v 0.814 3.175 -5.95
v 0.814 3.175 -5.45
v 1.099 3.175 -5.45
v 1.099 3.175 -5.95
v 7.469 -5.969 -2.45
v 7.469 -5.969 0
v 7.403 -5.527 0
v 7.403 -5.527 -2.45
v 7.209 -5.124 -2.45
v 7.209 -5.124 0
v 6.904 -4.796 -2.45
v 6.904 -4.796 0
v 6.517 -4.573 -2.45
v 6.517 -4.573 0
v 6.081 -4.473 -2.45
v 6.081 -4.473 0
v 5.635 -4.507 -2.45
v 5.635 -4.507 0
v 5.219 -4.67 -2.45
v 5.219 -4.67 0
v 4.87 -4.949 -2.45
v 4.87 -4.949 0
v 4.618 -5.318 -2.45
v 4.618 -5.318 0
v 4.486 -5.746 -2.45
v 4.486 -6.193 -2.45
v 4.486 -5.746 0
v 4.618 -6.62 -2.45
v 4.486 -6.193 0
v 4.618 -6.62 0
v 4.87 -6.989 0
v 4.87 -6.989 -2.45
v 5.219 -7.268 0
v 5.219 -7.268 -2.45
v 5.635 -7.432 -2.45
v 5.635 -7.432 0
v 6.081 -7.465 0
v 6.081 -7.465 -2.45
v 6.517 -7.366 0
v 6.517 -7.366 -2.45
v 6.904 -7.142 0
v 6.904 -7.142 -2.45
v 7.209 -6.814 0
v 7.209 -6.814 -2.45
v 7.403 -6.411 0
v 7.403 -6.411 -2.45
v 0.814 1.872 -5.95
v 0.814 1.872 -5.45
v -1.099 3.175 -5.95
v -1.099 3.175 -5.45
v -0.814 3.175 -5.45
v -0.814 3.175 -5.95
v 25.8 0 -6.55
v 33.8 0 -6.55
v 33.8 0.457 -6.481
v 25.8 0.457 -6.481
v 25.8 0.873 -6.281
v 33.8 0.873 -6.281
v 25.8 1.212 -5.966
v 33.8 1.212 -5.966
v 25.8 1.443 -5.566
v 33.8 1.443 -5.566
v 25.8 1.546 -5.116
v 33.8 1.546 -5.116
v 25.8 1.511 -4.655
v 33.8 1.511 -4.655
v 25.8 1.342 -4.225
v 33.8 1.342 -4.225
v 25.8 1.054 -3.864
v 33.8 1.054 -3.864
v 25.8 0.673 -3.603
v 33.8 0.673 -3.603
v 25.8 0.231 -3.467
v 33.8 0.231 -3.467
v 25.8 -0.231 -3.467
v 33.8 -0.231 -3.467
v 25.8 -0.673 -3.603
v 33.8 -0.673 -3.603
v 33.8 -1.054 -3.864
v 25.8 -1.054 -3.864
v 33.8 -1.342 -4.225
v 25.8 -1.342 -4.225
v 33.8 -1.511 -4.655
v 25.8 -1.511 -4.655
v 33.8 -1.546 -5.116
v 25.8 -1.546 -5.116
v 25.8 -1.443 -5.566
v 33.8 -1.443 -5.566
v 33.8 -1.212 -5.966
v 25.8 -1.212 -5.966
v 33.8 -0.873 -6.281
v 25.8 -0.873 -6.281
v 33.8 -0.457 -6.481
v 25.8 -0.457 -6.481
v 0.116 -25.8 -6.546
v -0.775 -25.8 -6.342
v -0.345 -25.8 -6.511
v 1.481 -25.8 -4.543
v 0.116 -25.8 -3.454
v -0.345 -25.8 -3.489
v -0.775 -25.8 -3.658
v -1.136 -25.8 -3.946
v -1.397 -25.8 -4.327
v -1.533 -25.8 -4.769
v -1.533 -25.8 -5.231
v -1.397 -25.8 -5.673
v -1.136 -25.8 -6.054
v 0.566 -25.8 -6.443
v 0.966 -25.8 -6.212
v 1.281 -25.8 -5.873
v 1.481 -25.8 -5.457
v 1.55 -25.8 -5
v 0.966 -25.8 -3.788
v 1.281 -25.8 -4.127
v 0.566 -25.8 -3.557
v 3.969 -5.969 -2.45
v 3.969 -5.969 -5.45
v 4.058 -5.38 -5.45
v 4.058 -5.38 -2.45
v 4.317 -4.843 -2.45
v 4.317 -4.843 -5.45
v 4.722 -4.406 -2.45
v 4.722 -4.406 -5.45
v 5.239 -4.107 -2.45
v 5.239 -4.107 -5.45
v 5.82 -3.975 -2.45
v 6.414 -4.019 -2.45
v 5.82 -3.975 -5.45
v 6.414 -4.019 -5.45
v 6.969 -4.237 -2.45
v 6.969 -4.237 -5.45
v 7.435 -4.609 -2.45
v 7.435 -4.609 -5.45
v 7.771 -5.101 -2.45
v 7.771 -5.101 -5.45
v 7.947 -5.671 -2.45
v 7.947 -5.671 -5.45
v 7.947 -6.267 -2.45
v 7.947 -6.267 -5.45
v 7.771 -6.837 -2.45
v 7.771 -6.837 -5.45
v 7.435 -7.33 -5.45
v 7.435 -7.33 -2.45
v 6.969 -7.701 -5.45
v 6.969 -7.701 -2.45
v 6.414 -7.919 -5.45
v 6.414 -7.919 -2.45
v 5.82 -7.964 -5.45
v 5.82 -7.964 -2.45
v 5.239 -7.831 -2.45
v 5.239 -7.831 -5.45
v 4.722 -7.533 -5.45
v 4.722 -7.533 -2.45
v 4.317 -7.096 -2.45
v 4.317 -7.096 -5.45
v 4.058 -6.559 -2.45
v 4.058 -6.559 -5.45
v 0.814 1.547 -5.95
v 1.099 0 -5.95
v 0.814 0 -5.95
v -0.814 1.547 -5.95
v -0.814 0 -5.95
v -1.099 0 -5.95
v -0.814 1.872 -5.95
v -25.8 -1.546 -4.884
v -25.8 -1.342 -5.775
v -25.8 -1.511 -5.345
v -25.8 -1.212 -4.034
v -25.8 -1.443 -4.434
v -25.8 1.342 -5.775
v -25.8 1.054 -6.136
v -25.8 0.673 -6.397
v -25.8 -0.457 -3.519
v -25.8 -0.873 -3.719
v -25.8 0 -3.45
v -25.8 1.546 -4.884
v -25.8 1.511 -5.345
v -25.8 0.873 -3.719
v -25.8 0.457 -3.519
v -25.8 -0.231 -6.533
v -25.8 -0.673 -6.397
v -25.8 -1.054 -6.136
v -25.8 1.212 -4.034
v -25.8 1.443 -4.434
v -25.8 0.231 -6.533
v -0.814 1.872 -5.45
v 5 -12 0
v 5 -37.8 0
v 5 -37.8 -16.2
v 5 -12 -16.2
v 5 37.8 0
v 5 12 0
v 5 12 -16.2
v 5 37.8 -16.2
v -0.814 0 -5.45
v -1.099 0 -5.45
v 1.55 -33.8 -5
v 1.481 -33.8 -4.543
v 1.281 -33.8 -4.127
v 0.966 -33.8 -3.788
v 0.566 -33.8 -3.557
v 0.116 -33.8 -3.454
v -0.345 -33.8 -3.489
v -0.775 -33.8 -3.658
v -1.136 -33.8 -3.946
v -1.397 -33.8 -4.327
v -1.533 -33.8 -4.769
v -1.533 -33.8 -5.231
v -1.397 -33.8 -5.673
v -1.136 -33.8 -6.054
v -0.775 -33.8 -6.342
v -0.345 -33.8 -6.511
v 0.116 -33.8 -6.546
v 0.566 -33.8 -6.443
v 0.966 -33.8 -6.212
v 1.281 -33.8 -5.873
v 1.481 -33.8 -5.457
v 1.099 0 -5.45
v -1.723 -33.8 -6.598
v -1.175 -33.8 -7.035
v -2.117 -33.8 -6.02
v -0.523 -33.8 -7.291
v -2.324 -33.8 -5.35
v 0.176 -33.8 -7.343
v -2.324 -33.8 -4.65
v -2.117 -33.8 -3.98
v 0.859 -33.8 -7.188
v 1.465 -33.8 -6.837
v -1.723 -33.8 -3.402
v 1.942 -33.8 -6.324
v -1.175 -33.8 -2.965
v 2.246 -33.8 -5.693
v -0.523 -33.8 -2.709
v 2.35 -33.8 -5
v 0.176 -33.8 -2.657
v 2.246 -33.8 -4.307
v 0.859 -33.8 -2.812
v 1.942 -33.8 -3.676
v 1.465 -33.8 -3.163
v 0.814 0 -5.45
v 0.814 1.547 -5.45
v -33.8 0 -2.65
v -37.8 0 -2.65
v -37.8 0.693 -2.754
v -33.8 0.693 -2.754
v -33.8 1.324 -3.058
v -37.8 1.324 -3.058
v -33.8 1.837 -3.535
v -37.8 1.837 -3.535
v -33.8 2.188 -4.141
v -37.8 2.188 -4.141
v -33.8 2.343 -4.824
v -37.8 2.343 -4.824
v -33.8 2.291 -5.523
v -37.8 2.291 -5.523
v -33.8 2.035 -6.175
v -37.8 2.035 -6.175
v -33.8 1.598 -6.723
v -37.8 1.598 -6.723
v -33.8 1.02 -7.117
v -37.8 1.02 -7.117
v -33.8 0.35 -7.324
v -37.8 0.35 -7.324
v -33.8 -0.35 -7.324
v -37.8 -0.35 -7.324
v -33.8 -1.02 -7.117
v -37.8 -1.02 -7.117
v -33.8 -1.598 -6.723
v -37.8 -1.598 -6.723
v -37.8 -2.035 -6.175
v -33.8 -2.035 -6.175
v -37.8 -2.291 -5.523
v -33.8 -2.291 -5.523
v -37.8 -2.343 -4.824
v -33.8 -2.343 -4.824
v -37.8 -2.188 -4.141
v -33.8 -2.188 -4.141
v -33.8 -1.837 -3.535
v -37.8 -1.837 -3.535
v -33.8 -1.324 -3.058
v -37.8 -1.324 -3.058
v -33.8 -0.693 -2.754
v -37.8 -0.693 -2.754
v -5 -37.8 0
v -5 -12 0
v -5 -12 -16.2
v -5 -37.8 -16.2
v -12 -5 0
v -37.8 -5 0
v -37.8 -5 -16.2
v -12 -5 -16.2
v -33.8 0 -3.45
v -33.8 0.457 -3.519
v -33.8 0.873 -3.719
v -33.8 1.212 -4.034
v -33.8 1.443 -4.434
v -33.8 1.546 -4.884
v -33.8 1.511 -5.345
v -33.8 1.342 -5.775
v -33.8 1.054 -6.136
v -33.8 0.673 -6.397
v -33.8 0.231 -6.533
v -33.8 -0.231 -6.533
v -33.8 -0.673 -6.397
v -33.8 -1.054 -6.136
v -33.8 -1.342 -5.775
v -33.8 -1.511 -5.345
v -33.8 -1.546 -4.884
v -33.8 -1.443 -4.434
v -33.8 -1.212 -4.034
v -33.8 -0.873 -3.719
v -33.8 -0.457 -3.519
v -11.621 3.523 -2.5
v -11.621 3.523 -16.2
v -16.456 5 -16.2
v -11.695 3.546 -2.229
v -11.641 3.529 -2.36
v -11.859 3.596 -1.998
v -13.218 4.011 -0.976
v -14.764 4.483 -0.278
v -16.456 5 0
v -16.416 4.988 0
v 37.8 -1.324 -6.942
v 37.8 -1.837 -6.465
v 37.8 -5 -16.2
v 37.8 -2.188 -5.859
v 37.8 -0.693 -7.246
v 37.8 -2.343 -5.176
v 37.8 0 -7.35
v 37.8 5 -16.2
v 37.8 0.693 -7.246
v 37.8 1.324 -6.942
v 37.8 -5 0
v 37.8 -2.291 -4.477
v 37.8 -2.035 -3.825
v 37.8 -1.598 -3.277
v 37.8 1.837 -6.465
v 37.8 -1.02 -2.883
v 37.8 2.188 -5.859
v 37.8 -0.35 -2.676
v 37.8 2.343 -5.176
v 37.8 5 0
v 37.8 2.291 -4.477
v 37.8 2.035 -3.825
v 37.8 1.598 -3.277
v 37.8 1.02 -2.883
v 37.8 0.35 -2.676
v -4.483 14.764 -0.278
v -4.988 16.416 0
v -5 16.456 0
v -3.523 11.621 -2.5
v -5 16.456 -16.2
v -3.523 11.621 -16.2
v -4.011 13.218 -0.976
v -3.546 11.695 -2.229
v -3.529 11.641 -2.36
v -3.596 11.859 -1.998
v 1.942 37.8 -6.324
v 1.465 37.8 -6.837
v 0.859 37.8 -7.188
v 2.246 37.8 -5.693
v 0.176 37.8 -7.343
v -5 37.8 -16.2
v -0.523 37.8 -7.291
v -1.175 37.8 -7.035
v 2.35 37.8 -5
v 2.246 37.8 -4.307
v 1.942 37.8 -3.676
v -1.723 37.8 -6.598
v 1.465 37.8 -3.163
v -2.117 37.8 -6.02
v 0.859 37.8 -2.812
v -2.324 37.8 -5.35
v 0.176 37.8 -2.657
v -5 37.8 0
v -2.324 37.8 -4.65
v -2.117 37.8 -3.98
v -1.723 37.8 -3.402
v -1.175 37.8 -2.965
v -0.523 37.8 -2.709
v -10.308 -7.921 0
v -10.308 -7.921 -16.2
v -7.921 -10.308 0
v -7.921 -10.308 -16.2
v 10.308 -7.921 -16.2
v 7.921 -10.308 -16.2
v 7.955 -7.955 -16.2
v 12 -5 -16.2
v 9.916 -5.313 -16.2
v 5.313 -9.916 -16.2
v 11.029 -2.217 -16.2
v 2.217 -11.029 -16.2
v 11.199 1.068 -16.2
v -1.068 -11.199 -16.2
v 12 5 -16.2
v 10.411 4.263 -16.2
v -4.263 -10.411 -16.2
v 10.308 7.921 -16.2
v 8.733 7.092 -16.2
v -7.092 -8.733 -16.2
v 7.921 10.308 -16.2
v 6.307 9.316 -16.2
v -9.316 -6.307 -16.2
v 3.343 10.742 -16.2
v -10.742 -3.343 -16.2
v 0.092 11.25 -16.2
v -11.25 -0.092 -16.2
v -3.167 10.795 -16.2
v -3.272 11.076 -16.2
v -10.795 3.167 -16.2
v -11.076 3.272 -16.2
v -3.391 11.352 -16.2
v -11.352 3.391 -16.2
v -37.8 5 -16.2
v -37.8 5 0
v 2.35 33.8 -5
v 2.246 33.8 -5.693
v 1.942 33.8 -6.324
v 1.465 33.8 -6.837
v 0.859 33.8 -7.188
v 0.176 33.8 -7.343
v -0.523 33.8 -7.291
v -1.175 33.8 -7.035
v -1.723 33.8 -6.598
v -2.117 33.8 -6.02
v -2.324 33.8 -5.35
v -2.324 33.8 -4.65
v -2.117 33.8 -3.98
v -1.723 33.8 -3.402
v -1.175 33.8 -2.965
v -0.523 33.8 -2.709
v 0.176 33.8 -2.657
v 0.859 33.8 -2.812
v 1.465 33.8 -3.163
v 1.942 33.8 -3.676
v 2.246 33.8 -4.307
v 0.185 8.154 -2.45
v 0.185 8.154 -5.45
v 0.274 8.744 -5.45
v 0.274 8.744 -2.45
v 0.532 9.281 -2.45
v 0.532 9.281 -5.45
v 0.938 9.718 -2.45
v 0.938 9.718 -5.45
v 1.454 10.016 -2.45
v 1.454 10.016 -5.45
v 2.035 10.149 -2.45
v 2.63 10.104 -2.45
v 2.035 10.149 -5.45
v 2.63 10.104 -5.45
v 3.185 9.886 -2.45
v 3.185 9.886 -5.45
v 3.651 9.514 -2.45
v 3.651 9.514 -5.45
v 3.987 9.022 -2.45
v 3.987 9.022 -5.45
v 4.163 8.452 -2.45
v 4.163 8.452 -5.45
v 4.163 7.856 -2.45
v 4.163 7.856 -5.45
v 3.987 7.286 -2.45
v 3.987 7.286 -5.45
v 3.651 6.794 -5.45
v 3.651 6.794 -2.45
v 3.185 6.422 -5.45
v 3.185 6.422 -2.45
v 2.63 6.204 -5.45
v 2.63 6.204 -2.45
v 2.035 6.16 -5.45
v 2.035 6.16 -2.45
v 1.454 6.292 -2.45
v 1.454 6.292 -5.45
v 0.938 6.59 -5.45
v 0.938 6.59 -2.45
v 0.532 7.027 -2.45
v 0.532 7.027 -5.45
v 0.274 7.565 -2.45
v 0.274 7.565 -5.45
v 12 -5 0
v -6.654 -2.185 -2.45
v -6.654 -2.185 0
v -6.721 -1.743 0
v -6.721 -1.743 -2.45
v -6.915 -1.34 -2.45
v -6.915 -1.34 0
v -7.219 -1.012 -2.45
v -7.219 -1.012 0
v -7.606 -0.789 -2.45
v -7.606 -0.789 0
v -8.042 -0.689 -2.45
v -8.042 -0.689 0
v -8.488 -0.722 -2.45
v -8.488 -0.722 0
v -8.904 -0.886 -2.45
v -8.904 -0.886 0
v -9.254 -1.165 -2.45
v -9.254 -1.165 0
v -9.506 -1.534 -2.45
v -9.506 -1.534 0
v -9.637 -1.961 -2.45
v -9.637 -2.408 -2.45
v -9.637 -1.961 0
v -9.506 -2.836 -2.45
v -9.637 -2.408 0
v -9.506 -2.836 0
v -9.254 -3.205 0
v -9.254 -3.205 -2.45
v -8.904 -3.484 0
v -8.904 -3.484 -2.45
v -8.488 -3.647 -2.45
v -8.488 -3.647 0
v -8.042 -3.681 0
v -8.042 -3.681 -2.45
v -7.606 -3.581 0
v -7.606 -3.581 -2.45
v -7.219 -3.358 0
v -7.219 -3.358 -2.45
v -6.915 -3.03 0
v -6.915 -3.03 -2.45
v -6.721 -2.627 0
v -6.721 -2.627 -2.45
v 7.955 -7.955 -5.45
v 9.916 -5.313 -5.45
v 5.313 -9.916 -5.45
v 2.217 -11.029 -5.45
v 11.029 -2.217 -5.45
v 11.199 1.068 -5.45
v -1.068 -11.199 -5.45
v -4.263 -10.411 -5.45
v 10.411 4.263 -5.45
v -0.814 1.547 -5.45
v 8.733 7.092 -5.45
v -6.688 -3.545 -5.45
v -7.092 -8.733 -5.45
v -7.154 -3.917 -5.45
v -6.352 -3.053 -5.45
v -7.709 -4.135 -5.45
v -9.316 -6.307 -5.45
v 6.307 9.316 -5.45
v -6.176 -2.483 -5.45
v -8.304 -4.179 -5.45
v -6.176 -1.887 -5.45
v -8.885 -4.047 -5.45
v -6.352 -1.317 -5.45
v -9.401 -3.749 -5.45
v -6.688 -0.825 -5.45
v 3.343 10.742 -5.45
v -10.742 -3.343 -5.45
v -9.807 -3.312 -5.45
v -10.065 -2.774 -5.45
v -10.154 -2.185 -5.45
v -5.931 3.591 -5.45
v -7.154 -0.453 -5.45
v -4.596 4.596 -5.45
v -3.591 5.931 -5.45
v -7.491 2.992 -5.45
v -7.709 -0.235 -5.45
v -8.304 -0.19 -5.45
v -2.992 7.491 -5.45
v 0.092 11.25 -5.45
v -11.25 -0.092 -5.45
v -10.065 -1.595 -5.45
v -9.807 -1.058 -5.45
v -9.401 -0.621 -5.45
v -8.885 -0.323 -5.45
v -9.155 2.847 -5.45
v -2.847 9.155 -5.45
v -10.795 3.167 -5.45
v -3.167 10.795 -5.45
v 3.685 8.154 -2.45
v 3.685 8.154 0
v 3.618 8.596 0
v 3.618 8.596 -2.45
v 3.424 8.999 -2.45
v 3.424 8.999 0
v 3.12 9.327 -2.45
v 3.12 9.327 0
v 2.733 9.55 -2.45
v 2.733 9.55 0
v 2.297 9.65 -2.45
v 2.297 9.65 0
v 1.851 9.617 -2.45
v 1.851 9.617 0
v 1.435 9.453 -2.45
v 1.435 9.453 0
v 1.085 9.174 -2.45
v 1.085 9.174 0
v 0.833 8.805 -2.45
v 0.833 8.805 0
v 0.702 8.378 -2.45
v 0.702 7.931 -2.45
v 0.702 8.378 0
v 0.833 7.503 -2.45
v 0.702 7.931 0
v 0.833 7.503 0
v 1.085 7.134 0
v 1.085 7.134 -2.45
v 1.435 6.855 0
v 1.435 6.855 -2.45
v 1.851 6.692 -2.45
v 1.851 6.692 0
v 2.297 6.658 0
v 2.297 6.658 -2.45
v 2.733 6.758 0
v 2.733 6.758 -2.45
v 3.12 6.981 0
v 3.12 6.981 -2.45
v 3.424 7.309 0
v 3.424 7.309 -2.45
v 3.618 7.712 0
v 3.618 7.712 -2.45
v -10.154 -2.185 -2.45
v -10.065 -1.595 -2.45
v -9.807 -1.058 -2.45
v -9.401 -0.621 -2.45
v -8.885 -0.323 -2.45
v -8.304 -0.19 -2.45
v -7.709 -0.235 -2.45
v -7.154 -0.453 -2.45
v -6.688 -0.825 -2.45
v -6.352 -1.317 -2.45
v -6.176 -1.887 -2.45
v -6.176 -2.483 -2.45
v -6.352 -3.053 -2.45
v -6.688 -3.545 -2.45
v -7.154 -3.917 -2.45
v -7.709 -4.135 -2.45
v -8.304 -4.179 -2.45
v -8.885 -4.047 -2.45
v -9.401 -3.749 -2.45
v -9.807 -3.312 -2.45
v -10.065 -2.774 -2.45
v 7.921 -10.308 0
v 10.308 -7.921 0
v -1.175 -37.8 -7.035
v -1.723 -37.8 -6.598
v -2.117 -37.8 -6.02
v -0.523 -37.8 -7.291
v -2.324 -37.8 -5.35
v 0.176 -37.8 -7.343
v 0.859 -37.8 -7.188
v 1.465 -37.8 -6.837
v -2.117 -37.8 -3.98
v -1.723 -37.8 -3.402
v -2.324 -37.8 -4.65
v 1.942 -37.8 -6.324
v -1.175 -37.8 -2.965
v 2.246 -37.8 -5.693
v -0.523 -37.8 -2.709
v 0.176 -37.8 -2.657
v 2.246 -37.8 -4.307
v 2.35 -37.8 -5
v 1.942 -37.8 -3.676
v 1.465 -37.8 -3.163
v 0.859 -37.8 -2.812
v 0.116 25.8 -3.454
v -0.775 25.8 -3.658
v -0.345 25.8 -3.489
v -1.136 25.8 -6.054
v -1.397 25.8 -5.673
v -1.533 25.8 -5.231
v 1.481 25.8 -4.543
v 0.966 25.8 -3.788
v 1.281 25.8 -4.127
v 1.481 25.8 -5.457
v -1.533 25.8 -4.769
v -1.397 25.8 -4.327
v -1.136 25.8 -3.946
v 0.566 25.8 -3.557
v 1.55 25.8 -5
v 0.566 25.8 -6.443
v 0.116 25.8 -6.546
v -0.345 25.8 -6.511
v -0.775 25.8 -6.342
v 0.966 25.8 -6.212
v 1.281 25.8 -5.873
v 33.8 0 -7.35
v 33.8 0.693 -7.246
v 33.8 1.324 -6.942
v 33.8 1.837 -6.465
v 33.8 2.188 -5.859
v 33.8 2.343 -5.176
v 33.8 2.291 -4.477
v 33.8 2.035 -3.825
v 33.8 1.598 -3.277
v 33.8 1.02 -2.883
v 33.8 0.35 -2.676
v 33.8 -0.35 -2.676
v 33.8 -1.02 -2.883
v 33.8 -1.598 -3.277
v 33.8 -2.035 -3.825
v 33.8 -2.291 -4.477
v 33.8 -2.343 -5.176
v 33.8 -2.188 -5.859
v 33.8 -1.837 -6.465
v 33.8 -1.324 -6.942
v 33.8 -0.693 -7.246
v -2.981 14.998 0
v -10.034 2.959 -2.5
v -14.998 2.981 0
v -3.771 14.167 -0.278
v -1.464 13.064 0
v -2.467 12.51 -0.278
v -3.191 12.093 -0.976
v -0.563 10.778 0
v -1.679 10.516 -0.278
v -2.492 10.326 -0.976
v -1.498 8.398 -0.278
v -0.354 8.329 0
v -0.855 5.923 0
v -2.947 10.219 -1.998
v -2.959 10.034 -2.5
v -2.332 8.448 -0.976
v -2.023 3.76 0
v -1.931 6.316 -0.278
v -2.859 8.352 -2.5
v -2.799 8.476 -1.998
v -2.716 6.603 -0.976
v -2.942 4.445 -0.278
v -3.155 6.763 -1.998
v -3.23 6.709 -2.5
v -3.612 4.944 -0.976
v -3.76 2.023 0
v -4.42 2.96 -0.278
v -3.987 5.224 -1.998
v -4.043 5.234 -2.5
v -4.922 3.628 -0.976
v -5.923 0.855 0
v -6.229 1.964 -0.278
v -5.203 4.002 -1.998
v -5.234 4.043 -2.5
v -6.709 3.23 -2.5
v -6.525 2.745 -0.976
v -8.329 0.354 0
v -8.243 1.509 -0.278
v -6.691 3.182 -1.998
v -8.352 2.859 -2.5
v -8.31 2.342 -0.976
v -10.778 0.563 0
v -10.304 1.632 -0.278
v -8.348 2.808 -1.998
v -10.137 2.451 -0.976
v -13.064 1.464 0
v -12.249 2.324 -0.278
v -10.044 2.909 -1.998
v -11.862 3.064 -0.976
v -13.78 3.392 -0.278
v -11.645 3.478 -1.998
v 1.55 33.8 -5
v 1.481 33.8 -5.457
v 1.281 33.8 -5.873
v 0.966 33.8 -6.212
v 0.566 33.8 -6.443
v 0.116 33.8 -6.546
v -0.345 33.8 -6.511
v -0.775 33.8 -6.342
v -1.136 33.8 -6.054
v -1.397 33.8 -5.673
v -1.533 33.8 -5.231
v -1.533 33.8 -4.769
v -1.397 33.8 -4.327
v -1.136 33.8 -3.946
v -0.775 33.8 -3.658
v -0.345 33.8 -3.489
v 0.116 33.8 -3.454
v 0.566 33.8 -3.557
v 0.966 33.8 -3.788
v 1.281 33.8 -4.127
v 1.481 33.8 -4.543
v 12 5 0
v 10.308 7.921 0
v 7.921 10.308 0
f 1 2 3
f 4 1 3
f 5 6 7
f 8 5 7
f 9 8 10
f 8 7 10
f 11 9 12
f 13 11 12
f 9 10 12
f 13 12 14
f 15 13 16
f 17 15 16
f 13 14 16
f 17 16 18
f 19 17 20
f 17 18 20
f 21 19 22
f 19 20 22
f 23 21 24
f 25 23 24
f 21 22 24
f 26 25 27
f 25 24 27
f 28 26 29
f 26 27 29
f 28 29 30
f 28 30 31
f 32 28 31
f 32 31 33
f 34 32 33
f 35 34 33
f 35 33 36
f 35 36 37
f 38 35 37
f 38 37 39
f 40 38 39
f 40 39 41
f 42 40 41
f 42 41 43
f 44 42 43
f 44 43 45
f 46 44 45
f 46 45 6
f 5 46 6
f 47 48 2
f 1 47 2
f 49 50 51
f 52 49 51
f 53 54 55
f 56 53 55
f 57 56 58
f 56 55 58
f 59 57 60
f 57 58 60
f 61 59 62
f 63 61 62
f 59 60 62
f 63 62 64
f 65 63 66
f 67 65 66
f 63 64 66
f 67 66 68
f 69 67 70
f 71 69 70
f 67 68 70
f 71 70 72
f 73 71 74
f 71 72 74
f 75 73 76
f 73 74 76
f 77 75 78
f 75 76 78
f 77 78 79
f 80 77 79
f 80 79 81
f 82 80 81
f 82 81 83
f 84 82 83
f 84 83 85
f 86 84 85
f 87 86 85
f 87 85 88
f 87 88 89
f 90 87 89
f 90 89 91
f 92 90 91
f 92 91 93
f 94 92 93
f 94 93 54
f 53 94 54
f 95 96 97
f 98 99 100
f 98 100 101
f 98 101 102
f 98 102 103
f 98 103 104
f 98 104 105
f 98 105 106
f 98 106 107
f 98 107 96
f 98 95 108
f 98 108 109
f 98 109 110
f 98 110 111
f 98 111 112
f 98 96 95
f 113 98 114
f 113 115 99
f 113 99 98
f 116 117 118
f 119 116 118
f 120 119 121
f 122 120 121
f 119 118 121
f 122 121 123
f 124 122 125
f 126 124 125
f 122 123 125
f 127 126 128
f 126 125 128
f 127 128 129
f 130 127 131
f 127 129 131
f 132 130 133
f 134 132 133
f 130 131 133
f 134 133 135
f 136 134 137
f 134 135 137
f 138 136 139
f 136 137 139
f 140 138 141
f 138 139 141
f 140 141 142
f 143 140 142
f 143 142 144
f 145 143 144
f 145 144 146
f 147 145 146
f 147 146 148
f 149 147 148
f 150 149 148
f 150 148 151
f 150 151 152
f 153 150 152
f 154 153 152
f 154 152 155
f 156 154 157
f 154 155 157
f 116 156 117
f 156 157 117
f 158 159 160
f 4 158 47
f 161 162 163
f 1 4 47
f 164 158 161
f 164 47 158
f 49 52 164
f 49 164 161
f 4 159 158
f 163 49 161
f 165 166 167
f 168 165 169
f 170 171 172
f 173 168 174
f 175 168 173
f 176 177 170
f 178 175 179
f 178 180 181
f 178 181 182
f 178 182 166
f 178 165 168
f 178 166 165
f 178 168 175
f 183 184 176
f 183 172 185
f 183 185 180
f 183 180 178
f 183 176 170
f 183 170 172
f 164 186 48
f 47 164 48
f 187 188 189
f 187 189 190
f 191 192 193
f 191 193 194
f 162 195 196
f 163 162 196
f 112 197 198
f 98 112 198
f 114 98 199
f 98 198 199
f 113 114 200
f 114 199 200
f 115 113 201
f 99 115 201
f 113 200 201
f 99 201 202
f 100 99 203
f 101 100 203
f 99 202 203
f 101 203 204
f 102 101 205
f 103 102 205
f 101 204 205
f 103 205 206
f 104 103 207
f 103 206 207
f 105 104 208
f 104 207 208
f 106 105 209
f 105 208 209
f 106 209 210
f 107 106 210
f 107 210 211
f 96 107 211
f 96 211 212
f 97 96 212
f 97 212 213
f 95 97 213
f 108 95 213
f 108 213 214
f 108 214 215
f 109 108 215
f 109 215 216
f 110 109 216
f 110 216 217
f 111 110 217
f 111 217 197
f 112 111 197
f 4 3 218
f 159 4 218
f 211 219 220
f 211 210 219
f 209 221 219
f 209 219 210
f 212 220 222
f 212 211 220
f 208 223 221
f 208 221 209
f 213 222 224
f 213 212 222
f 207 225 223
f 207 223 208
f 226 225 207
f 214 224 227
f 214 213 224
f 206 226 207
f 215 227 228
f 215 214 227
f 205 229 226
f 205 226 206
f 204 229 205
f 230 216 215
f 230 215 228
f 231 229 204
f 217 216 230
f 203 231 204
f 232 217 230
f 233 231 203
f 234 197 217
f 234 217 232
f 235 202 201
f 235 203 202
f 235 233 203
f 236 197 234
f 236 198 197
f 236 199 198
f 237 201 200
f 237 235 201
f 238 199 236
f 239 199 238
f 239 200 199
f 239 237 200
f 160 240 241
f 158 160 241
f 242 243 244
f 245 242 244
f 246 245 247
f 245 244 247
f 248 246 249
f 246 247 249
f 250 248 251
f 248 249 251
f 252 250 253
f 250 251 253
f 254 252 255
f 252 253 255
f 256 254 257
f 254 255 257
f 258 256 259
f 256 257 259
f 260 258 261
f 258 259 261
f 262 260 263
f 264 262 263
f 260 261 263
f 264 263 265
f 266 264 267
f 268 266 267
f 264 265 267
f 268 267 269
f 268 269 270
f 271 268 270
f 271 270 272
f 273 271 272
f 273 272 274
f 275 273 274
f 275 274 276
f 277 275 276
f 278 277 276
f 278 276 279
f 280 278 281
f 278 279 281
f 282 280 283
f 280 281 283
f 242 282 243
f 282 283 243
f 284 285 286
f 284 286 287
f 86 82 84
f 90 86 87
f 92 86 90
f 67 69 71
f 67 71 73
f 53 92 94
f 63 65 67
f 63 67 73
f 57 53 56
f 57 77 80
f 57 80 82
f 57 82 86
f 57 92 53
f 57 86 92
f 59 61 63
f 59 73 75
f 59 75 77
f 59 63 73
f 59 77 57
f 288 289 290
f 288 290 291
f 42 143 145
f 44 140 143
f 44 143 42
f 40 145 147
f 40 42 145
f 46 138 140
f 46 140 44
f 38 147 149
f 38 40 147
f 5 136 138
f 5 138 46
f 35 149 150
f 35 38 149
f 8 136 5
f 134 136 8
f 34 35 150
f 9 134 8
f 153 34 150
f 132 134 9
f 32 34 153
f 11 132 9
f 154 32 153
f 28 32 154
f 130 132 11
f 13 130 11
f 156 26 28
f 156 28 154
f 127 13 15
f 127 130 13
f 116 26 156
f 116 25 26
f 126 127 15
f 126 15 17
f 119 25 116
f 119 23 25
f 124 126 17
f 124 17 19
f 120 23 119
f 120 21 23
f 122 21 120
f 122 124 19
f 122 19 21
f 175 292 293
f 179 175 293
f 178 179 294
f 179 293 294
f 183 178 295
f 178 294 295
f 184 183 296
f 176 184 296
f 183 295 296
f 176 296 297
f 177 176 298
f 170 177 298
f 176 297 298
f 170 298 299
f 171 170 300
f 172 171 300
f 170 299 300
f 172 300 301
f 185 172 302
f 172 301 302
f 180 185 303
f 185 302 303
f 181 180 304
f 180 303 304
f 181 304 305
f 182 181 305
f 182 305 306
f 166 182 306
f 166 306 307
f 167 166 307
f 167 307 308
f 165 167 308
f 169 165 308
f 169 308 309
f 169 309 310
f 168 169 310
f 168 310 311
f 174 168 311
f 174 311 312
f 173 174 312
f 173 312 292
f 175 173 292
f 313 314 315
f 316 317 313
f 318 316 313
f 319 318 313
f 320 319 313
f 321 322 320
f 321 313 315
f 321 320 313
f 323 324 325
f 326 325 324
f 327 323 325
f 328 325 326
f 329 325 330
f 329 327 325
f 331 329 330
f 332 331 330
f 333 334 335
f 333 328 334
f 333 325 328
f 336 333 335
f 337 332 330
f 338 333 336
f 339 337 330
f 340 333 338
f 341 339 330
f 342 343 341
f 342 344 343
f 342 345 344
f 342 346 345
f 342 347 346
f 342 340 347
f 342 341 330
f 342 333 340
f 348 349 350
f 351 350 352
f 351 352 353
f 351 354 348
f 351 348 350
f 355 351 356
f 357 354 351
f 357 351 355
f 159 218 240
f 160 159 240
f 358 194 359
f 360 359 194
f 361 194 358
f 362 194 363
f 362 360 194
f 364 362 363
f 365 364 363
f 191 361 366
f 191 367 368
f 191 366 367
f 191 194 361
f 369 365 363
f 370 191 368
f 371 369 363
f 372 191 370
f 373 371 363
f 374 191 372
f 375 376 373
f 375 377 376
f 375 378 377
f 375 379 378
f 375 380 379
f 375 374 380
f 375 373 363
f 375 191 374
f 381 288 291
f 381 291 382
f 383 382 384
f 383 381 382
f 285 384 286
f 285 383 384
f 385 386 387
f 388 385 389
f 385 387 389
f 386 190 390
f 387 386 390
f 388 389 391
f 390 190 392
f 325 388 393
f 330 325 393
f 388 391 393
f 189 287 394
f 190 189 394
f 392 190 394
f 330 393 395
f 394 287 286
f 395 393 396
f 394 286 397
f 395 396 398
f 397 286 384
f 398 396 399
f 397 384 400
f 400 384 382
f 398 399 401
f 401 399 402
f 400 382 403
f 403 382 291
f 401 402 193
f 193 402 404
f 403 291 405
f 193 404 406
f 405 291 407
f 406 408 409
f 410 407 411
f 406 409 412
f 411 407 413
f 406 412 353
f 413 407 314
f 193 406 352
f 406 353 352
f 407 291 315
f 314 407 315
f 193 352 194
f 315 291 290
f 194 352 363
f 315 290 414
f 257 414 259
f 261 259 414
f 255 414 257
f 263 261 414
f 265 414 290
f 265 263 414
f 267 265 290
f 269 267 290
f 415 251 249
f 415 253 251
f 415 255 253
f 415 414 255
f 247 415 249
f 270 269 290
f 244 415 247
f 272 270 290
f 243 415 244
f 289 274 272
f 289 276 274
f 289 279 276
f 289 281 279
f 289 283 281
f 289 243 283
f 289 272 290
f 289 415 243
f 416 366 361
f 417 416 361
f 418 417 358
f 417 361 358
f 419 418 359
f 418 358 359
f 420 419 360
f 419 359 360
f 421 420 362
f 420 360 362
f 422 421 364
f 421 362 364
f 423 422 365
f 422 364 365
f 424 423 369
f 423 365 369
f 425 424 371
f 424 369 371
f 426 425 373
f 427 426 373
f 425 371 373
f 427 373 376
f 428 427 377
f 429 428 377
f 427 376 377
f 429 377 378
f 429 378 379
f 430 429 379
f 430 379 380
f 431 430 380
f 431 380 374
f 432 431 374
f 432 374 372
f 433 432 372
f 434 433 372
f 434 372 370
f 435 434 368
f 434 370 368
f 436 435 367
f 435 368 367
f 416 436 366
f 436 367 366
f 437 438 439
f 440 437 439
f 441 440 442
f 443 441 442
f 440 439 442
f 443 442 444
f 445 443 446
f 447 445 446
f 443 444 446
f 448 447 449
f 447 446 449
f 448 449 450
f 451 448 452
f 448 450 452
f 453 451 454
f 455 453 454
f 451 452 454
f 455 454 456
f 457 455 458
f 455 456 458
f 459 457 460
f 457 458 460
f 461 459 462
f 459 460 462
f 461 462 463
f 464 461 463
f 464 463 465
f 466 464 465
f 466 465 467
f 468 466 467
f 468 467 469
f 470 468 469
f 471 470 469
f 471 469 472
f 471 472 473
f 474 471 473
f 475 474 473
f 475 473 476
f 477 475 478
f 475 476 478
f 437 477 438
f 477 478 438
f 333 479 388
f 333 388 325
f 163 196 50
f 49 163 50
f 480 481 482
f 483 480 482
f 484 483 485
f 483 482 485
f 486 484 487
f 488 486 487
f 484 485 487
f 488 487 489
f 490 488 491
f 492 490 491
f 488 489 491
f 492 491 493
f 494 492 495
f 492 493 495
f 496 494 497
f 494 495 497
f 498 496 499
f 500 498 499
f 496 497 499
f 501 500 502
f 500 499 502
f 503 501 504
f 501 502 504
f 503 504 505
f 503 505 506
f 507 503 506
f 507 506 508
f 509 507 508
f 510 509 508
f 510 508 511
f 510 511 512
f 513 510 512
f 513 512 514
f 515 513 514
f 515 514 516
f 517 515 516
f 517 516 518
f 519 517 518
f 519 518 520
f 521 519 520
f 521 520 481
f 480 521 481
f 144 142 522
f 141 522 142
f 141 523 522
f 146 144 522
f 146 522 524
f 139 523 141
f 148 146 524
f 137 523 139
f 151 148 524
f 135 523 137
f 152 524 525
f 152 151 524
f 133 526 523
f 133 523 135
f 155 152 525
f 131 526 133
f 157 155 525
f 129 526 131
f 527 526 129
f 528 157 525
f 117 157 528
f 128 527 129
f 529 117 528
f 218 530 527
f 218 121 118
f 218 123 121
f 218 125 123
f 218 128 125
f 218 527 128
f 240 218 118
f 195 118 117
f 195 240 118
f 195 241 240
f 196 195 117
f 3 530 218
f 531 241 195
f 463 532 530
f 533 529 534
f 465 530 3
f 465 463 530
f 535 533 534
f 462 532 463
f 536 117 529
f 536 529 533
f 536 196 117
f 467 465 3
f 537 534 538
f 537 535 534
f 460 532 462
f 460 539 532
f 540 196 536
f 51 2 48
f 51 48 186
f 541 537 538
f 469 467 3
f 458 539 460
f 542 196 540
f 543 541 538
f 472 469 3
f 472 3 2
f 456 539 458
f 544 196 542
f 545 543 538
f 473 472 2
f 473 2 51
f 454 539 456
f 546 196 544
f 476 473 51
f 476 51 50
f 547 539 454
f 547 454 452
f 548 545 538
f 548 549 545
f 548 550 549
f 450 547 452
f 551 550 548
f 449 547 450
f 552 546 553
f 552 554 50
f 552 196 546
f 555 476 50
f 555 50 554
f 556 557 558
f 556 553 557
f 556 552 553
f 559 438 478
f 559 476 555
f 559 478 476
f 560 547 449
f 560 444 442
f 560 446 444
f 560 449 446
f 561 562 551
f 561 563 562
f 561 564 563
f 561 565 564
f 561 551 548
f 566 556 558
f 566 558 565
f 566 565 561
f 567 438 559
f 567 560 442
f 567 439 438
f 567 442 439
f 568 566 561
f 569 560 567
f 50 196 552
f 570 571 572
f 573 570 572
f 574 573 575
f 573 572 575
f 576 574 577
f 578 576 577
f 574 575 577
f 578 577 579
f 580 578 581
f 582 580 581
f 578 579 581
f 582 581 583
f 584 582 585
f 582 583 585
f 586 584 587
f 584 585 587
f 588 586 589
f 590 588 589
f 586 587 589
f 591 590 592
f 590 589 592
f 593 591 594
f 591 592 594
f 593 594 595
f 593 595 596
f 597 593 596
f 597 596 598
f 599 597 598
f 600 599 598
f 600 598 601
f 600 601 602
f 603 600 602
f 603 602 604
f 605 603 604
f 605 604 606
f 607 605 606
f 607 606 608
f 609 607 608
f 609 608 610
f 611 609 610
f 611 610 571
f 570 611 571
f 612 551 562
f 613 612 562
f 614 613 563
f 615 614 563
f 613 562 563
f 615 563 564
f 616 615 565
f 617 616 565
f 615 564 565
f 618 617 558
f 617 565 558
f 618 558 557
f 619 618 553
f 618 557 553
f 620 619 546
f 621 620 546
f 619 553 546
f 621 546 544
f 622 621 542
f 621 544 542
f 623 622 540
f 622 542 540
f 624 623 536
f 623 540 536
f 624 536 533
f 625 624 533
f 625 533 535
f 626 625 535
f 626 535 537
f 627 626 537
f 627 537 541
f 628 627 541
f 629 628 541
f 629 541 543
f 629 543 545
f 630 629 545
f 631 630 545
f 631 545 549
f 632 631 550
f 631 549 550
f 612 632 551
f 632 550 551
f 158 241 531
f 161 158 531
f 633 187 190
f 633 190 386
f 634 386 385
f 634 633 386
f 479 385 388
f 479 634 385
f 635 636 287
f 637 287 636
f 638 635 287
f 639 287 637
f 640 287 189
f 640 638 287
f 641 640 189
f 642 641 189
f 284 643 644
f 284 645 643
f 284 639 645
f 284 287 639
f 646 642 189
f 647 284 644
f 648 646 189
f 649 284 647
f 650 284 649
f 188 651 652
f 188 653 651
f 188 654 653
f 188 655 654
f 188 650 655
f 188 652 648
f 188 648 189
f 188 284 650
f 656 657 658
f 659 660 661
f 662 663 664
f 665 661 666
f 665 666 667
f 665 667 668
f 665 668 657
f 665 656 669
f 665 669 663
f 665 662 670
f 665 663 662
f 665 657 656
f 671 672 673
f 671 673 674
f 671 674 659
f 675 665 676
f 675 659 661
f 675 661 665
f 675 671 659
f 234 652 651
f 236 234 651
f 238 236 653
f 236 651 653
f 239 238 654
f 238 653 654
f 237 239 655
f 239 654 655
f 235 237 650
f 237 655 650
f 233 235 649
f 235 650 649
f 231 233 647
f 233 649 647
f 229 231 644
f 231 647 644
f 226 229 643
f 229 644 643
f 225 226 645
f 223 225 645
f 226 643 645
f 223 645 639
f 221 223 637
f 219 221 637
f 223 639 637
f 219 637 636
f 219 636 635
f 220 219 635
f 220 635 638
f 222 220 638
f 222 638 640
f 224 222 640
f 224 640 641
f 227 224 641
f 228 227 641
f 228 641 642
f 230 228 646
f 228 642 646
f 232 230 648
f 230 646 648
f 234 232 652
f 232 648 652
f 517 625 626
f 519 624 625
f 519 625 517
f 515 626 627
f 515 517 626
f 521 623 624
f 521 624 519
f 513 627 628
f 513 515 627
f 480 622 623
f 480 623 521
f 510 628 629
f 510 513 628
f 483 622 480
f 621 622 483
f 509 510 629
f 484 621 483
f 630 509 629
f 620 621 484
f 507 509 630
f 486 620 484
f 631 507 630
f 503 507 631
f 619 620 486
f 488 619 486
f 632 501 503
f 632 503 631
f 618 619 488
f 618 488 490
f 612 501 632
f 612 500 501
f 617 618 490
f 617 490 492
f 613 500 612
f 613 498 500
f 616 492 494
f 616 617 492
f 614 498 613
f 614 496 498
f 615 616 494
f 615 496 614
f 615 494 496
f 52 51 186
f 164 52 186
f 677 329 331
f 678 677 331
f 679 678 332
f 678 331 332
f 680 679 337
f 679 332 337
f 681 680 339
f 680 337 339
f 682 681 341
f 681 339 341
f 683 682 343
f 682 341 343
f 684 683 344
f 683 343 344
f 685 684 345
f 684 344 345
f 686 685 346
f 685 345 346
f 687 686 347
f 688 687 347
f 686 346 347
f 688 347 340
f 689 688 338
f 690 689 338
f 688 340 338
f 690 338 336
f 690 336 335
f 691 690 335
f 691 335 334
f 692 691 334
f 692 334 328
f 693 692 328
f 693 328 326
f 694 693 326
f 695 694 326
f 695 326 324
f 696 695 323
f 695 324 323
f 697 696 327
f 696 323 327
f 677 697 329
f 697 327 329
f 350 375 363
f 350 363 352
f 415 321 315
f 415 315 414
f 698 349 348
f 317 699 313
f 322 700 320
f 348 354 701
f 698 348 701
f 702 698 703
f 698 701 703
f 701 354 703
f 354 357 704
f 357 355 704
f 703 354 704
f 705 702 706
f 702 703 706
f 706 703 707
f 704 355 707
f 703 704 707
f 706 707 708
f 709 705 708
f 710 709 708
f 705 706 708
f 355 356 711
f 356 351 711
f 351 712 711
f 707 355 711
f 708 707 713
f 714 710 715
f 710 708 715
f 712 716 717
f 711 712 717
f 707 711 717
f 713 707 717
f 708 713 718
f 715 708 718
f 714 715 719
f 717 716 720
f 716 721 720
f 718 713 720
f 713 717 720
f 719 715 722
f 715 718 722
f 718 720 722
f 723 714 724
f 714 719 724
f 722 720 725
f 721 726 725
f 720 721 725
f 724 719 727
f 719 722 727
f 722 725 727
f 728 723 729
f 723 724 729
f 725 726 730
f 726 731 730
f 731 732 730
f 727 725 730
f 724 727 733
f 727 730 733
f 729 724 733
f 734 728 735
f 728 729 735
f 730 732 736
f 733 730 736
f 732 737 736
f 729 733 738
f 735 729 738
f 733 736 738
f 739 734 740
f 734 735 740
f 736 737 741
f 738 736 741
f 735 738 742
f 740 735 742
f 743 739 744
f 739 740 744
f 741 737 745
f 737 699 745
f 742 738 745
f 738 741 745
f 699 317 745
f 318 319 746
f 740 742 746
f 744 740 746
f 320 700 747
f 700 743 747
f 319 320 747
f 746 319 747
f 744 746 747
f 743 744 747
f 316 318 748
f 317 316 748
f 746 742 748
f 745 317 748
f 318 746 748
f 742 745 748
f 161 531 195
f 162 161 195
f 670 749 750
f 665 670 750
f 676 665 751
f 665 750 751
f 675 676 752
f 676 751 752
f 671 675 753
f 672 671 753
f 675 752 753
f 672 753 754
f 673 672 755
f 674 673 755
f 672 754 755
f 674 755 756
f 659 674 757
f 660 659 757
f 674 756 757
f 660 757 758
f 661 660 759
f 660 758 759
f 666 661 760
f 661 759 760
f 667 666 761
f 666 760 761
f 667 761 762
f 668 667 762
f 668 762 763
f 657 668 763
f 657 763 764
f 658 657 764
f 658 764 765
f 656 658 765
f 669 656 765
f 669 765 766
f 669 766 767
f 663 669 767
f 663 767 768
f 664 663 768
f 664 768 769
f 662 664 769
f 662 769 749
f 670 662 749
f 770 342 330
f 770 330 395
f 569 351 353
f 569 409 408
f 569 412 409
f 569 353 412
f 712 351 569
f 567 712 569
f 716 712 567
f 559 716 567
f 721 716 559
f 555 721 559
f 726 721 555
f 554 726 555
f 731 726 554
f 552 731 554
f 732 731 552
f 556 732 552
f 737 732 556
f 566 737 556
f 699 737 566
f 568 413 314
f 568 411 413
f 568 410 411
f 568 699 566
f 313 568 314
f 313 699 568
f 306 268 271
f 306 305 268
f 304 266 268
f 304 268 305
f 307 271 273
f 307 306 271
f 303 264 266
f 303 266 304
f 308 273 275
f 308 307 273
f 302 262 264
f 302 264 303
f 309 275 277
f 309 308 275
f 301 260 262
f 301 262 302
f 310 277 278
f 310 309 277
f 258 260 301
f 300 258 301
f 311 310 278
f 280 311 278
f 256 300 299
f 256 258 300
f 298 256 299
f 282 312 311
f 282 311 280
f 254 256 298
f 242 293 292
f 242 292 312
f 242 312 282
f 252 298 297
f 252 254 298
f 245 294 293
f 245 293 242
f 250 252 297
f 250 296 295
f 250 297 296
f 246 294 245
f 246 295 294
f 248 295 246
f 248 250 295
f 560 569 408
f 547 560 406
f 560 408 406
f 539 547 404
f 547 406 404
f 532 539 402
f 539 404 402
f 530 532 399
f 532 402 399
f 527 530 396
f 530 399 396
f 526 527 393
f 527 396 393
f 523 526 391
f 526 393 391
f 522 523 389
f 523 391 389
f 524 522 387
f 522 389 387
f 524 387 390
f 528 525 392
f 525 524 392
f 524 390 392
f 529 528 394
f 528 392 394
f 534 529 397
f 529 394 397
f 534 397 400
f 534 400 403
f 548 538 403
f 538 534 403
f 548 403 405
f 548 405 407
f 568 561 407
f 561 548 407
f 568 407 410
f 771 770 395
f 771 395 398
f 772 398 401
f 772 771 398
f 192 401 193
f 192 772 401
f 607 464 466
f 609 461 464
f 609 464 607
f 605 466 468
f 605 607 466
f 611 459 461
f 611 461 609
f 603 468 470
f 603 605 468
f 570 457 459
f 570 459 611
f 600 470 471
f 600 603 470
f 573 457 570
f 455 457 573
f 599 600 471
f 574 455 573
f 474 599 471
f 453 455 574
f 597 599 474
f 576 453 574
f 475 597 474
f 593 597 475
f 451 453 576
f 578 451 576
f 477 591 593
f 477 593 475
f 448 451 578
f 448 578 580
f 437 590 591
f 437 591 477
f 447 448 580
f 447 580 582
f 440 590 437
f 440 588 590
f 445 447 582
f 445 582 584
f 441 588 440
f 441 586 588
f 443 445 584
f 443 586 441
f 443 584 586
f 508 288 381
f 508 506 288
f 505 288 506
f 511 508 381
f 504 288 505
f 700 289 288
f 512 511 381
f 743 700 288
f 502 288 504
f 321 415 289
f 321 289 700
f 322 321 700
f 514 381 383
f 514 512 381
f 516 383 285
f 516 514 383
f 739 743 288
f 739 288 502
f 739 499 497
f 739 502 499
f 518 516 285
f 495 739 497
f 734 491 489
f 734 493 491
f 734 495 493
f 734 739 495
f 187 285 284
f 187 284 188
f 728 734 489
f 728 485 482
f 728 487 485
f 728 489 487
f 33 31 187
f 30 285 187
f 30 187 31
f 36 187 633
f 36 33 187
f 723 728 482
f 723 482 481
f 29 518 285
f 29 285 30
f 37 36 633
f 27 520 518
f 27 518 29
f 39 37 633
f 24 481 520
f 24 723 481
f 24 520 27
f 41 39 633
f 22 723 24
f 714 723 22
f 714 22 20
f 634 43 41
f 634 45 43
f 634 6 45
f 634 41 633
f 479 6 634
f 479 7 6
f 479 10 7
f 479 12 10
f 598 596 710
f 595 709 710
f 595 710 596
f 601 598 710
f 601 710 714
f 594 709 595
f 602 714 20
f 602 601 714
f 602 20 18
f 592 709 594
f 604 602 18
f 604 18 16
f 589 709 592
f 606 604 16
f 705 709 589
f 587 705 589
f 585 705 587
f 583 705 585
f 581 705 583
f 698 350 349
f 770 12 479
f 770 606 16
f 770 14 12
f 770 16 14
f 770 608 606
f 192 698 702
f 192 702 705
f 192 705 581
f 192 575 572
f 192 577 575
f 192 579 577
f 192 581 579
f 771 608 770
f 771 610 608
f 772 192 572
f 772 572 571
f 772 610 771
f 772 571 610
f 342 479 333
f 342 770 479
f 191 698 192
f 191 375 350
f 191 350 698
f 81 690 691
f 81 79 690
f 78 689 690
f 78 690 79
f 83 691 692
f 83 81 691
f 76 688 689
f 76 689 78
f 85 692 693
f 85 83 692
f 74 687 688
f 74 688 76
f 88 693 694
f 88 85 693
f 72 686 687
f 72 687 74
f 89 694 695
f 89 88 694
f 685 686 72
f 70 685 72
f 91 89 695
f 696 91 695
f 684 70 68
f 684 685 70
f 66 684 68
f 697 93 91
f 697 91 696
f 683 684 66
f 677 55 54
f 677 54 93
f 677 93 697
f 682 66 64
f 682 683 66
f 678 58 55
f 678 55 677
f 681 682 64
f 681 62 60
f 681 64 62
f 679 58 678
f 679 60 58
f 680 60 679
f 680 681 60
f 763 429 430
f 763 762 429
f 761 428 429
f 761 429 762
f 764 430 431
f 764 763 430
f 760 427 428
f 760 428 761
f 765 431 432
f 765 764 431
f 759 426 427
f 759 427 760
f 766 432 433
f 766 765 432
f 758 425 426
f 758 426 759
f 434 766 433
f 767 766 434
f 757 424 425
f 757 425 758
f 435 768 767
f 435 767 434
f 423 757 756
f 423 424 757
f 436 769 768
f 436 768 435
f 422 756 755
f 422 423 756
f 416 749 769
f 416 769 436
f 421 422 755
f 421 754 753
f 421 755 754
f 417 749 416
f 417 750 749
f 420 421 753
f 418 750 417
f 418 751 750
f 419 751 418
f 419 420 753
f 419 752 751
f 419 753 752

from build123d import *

# Parameters (mm, degrees)
BOSS_EXTRUDE1_DEPTH     = 22.7
SKETCH5_R               = 1.5
CUT_EXTRUDE1_DEPTH      = 70
CUT_EXTRUDE3_DEPTH      = 17.25
CUT_EXTRUDE3_DEPTH_BACK = 17.25
SKETCH6_R               = 11.25
SKETCH7_R               = 2
CUT_EXTRUDE4_DEPTH      = 3
CUT_EXTRUDE5_DEPTH      = 58
CUT_EXTRUDE5_DEPTH_BACK = 66
SKETCH8_W               = 6.5
SKETCH8_H               = 75.6
SKETCH9_R               = 2.35
SKETCH9_R_2             = 1.55
CUT_EXTRUDE7_DEPTH      = 4
SKETCH9_3_R             = 1.55
CUT_EXTRUDE20_DEPTH     = 12
SKETCH21_R              = 2.35
SKETCH21_R_2            = 1.55
CUT_EXTRUDE22_DEPTH     = 4
SKETCH21_2_R            = 1.55
CUT_EXTRUDE23_DEPTH     = 12
CUT_EXTRUDE24_START     = -4
SKETCH19_R              = 2.35
SKETCH19_R_2            = 1.55
CUT_EXTRUDE24_DEPTH     = 4
CUT_EXTRUDE25_START     = -12
SKETCH19_2_R            = 1.55
CUT_EXTRUDE25_DEPTH     = 12
CUT_EXTRUDE26_START     = -4
SKETCH20_R              = 2.35
SKETCH20_R_2            = 1.55
CUT_EXTRUDE26_DEPTH     = 4
CUT_EXTRUDE27_START     = -12
SKETCH20_2_R            = 1.55
CUT_EXTRUDE27_DEPTH     = 12
FILLET2_R               = 2.5
BOSS_EXTRUDE2_DEPTH     = 0.5


with BuildPart() as part:
    # Sketch4 → Boss-Extrude1 (new body)
    with BuildSketch(Plane.XY):
        with BuildLine():
            Line((-5, 37.8), (-5, 12))
            ThreePointArc((-5, 12), (-9.192388155, 9.192388155), (-12, 5))
            Line((-12, 5), (-37.8, 5))
            Line((-37.8, 5), (-37.8, -5))
            Line((-37.8, -5), (-12, -5))
            ThreePointArc((-12, -5), (-9.192388155, -9.192388155), (-5, -12))
            Line((-5, -12), (-5, -37.8))
            Line((-5, -37.8), (5, -37.8))
            Line((5, -37.8), (5, -12))
            ThreePointArc((5, -12), (9.192388155, -9.192388155), (12, -5))
            Line((12, -5), (37.8, -5))
            Line((37.8, -5), (37.8, 5))
            Line((37.8, 5), (12, 5))
            ThreePointArc((12, 5), (9.192388155, 9.192388155), (5, 12))
            Line((5, 12), (5, 37.8))
            Line((5, 37.8), (-5, 37.8))
        make_face()
    extrude(amount=-BOSS_EXTRUDE1_DEPTH)

    # Sketch5 → Cut-Extrude1 (cut)
    with BuildSketch(Plane.XY):
        with Locations((2.184887392, 8.154110756)):
            Circle(SKETCH5_R)
        with Locations((-8.154110756, -2.184887392)):
            Circle(SKETCH5_R)
        with Locations((5.969223364, -5.969223364)):
            Circle(SKETCH5_R)
        with BuildLine():
            Line((-5, 16.456455054), (-3.523070126, 11.621395871))
            ThreePointArc((-3.523070126, 11.621395871), (-4.596194078, 4.596194078), (-11.621395871, 3.523070126))
            Line((-11.621395871, 3.523070126), (-16.456455054, 5))
            Line((-16.456455054, 5), (-14.526937175, 6.929517879))
            ThreePointArc((-14.526937175, 6.929517879), (-13.081475452, 13.081475452), (-6.929517879, 14.526937175))
            Line((-6.929517879, 14.526937175), (-5, 16.456455054))
        make_face()
    extrude(amount=-CUT_EXTRUDE1_DEPTH, mode=Mode.SUBTRACT)

    # Sketch6 → Cut-Extrude3 (cut, two sides: drawn at the far end of the back side and taken through both)
    with BuildSketch(Plane(origin=(0, 0, -22.7), x_dir=(-1, 0, 0), z_dir=(0, 0, -1)).offset(-CUT_EXTRUDE3_DEPTH_BACK)):
        Circle(SKETCH6_R)
    extrude(amount=CUT_EXTRUDE3_DEPTH + CUT_EXTRUDE3_DEPTH_BACK, mode=Mode.SUBTRACT)

    # Sketch7 → Cut-Extrude4 (cut)
    with BuildSketch(Plane(origin=(0, 0, -5.45), x_dir=(-1, 0, 0), z_dir=(0, 0, -1))):
        with Locations((-2.184887392, 8.154110756)):
            Circle(SKETCH7_R)
        with Locations((-5.969223364, -5.969223364)):
            Circle(SKETCH7_R)
        with Locations((8.154110756, -2.184887392)):
            Circle(SKETCH7_R)
    extrude(amount=-CUT_EXTRUDE4_DEPTH, mode=Mode.SUBTRACT)

    # Sketch8 → Cut-Extrude5 (cut, two sides: drawn at the far end of the back side and taken through both)
    with BuildSketch(Plane.ZY.offset(5).offset(-CUT_EXTRUDE5_DEPTH_BACK)):
        with Locations((-19.45, 0)):
            Rectangle(SKETCH8_W, SKETCH8_H)
    extrude(amount=CUT_EXTRUDE5_DEPTH + CUT_EXTRUDE5_DEPTH_BACK, mode=Mode.SUBTRACT)

    # Sketch9 → Cut-Extrude7 (cut)
    with BuildSketch(Plane(origin=(0, 37.8, 0), x_dir=(1, 0, 0), z_dir=(0, 1, 0))):
        with Locations((0, 5)):
            Circle(SKETCH9_R)
        with Locations((0, 5)):
            Circle(SKETCH9_R_2, mode=Mode.SUBTRACT)
    extrude(amount=-CUT_EXTRUDE7_DEPTH, mode=Mode.SUBTRACT)

    # Sketch9<3> → Cut-Extrude20 (cut)
    with BuildSketch(Plane(origin=(0, 37.8, 0), x_dir=(1, 0, 0), z_dir=(0, 1, 0))):
        with Locations((0, 5)):
            Circle(SKETCH9_3_R)
    extrude(amount=-CUT_EXTRUDE20_DEPTH, mode=Mode.SUBTRACT)

    # Sketch21 → Cut-Extrude22 (cut)
    with BuildSketch(Plane.ZY.offset(37.8)):
        with Locations((-5, 0)):
            Circle(SKETCH21_R)
        with Locations((-5, 0)):
            Circle(SKETCH21_R_2, mode=Mode.SUBTRACT)
    extrude(amount=-CUT_EXTRUDE22_DEPTH, mode=Mode.SUBTRACT)

    # Sketch21<2> → Cut-Extrude23 (cut)
    with BuildSketch(Plane.ZY.offset(37.8)):
        with Locations((-5, 0)):
            Circle(SKETCH21_2_R)
    extrude(amount=-CUT_EXTRUDE23_DEPTH, mode=Mode.SUBTRACT)

    # Sketch19 → Cut-Extrude24 (cut)
    with BuildSketch(Plane(origin=(37.8, 0, 0), x_dir=(0, 0, -1), z_dir=(1, 0, 0)).offset(CUT_EXTRUDE24_START)):
        with Locations((5, 0)):
            Circle(SKETCH19_R)
        with Locations((5, 0)):
            Circle(SKETCH19_R_2, mode=Mode.SUBTRACT)
    extrude(amount=CUT_EXTRUDE24_DEPTH, mode=Mode.SUBTRACT)

    # Sketch19<2> → Cut-Extrude25 (cut)
    with BuildSketch(Plane(origin=(37.8, 0, 0), x_dir=(0, 0, -1), z_dir=(1, 0, 0)).offset(CUT_EXTRUDE25_START)):
        with Locations((5, 0)):
            Circle(SKETCH19_2_R)
    extrude(amount=CUT_EXTRUDE25_DEPTH, mode=Mode.SUBTRACT)

    # Sketch20 → Cut-Extrude26 (cut)
    with BuildSketch(Plane.XZ.offset(37.8).offset(CUT_EXTRUDE26_START)):
        with Locations((0, -5)):
            Circle(SKETCH20_R)
        with Locations((0, -5)):
            Circle(SKETCH20_R_2, mode=Mode.SUBTRACT)
    extrude(amount=CUT_EXTRUDE26_DEPTH, mode=Mode.SUBTRACT)

    # Sketch20<2> → Cut-Extrude27 (cut)
    with BuildSketch(Plane.XZ.offset(37.8).offset(CUT_EXTRUDE27_START)):
        with Locations((0, -5)):
            Circle(SKETCH20_2_R)
    extrude(amount=CUT_EXTRUDE27_DEPTH, mode=Mode.SUBTRACT)

    # Fillet2
    fillet2_edges = [part.edges().sort_by_distance(p)[0] for p in [
        (-4.596194078, 4.596194078, 0),
    ]]
    fillet(fillet2_edges, radius=FILLET2_R)

    # Sketch22 → Boss-Extrude2 (add)
    with BuildSketch(Plane(origin=(0, 0, -5.45), x_dir=(-1, 0, 0), z_dir=(0, 0, -1))):
        Polygon((1.099038462, 3.175), (0.814102564, 3.175), (0.814102564, 1.872435897), (-0.814102564, 1.872435897), (-0.814102564, 3.175), (-1.099038462, 3.175), (-1.099038462, 0), (-0.814102564, 0), (-0.814102564, 1.546794872), (0.814102564, 1.546794872), (0.814102564, 0), (1.099038462, 0), align=None)
    extrude(amount=BOSS_EXTRUDE2_DEPTH)


solid = part.part
